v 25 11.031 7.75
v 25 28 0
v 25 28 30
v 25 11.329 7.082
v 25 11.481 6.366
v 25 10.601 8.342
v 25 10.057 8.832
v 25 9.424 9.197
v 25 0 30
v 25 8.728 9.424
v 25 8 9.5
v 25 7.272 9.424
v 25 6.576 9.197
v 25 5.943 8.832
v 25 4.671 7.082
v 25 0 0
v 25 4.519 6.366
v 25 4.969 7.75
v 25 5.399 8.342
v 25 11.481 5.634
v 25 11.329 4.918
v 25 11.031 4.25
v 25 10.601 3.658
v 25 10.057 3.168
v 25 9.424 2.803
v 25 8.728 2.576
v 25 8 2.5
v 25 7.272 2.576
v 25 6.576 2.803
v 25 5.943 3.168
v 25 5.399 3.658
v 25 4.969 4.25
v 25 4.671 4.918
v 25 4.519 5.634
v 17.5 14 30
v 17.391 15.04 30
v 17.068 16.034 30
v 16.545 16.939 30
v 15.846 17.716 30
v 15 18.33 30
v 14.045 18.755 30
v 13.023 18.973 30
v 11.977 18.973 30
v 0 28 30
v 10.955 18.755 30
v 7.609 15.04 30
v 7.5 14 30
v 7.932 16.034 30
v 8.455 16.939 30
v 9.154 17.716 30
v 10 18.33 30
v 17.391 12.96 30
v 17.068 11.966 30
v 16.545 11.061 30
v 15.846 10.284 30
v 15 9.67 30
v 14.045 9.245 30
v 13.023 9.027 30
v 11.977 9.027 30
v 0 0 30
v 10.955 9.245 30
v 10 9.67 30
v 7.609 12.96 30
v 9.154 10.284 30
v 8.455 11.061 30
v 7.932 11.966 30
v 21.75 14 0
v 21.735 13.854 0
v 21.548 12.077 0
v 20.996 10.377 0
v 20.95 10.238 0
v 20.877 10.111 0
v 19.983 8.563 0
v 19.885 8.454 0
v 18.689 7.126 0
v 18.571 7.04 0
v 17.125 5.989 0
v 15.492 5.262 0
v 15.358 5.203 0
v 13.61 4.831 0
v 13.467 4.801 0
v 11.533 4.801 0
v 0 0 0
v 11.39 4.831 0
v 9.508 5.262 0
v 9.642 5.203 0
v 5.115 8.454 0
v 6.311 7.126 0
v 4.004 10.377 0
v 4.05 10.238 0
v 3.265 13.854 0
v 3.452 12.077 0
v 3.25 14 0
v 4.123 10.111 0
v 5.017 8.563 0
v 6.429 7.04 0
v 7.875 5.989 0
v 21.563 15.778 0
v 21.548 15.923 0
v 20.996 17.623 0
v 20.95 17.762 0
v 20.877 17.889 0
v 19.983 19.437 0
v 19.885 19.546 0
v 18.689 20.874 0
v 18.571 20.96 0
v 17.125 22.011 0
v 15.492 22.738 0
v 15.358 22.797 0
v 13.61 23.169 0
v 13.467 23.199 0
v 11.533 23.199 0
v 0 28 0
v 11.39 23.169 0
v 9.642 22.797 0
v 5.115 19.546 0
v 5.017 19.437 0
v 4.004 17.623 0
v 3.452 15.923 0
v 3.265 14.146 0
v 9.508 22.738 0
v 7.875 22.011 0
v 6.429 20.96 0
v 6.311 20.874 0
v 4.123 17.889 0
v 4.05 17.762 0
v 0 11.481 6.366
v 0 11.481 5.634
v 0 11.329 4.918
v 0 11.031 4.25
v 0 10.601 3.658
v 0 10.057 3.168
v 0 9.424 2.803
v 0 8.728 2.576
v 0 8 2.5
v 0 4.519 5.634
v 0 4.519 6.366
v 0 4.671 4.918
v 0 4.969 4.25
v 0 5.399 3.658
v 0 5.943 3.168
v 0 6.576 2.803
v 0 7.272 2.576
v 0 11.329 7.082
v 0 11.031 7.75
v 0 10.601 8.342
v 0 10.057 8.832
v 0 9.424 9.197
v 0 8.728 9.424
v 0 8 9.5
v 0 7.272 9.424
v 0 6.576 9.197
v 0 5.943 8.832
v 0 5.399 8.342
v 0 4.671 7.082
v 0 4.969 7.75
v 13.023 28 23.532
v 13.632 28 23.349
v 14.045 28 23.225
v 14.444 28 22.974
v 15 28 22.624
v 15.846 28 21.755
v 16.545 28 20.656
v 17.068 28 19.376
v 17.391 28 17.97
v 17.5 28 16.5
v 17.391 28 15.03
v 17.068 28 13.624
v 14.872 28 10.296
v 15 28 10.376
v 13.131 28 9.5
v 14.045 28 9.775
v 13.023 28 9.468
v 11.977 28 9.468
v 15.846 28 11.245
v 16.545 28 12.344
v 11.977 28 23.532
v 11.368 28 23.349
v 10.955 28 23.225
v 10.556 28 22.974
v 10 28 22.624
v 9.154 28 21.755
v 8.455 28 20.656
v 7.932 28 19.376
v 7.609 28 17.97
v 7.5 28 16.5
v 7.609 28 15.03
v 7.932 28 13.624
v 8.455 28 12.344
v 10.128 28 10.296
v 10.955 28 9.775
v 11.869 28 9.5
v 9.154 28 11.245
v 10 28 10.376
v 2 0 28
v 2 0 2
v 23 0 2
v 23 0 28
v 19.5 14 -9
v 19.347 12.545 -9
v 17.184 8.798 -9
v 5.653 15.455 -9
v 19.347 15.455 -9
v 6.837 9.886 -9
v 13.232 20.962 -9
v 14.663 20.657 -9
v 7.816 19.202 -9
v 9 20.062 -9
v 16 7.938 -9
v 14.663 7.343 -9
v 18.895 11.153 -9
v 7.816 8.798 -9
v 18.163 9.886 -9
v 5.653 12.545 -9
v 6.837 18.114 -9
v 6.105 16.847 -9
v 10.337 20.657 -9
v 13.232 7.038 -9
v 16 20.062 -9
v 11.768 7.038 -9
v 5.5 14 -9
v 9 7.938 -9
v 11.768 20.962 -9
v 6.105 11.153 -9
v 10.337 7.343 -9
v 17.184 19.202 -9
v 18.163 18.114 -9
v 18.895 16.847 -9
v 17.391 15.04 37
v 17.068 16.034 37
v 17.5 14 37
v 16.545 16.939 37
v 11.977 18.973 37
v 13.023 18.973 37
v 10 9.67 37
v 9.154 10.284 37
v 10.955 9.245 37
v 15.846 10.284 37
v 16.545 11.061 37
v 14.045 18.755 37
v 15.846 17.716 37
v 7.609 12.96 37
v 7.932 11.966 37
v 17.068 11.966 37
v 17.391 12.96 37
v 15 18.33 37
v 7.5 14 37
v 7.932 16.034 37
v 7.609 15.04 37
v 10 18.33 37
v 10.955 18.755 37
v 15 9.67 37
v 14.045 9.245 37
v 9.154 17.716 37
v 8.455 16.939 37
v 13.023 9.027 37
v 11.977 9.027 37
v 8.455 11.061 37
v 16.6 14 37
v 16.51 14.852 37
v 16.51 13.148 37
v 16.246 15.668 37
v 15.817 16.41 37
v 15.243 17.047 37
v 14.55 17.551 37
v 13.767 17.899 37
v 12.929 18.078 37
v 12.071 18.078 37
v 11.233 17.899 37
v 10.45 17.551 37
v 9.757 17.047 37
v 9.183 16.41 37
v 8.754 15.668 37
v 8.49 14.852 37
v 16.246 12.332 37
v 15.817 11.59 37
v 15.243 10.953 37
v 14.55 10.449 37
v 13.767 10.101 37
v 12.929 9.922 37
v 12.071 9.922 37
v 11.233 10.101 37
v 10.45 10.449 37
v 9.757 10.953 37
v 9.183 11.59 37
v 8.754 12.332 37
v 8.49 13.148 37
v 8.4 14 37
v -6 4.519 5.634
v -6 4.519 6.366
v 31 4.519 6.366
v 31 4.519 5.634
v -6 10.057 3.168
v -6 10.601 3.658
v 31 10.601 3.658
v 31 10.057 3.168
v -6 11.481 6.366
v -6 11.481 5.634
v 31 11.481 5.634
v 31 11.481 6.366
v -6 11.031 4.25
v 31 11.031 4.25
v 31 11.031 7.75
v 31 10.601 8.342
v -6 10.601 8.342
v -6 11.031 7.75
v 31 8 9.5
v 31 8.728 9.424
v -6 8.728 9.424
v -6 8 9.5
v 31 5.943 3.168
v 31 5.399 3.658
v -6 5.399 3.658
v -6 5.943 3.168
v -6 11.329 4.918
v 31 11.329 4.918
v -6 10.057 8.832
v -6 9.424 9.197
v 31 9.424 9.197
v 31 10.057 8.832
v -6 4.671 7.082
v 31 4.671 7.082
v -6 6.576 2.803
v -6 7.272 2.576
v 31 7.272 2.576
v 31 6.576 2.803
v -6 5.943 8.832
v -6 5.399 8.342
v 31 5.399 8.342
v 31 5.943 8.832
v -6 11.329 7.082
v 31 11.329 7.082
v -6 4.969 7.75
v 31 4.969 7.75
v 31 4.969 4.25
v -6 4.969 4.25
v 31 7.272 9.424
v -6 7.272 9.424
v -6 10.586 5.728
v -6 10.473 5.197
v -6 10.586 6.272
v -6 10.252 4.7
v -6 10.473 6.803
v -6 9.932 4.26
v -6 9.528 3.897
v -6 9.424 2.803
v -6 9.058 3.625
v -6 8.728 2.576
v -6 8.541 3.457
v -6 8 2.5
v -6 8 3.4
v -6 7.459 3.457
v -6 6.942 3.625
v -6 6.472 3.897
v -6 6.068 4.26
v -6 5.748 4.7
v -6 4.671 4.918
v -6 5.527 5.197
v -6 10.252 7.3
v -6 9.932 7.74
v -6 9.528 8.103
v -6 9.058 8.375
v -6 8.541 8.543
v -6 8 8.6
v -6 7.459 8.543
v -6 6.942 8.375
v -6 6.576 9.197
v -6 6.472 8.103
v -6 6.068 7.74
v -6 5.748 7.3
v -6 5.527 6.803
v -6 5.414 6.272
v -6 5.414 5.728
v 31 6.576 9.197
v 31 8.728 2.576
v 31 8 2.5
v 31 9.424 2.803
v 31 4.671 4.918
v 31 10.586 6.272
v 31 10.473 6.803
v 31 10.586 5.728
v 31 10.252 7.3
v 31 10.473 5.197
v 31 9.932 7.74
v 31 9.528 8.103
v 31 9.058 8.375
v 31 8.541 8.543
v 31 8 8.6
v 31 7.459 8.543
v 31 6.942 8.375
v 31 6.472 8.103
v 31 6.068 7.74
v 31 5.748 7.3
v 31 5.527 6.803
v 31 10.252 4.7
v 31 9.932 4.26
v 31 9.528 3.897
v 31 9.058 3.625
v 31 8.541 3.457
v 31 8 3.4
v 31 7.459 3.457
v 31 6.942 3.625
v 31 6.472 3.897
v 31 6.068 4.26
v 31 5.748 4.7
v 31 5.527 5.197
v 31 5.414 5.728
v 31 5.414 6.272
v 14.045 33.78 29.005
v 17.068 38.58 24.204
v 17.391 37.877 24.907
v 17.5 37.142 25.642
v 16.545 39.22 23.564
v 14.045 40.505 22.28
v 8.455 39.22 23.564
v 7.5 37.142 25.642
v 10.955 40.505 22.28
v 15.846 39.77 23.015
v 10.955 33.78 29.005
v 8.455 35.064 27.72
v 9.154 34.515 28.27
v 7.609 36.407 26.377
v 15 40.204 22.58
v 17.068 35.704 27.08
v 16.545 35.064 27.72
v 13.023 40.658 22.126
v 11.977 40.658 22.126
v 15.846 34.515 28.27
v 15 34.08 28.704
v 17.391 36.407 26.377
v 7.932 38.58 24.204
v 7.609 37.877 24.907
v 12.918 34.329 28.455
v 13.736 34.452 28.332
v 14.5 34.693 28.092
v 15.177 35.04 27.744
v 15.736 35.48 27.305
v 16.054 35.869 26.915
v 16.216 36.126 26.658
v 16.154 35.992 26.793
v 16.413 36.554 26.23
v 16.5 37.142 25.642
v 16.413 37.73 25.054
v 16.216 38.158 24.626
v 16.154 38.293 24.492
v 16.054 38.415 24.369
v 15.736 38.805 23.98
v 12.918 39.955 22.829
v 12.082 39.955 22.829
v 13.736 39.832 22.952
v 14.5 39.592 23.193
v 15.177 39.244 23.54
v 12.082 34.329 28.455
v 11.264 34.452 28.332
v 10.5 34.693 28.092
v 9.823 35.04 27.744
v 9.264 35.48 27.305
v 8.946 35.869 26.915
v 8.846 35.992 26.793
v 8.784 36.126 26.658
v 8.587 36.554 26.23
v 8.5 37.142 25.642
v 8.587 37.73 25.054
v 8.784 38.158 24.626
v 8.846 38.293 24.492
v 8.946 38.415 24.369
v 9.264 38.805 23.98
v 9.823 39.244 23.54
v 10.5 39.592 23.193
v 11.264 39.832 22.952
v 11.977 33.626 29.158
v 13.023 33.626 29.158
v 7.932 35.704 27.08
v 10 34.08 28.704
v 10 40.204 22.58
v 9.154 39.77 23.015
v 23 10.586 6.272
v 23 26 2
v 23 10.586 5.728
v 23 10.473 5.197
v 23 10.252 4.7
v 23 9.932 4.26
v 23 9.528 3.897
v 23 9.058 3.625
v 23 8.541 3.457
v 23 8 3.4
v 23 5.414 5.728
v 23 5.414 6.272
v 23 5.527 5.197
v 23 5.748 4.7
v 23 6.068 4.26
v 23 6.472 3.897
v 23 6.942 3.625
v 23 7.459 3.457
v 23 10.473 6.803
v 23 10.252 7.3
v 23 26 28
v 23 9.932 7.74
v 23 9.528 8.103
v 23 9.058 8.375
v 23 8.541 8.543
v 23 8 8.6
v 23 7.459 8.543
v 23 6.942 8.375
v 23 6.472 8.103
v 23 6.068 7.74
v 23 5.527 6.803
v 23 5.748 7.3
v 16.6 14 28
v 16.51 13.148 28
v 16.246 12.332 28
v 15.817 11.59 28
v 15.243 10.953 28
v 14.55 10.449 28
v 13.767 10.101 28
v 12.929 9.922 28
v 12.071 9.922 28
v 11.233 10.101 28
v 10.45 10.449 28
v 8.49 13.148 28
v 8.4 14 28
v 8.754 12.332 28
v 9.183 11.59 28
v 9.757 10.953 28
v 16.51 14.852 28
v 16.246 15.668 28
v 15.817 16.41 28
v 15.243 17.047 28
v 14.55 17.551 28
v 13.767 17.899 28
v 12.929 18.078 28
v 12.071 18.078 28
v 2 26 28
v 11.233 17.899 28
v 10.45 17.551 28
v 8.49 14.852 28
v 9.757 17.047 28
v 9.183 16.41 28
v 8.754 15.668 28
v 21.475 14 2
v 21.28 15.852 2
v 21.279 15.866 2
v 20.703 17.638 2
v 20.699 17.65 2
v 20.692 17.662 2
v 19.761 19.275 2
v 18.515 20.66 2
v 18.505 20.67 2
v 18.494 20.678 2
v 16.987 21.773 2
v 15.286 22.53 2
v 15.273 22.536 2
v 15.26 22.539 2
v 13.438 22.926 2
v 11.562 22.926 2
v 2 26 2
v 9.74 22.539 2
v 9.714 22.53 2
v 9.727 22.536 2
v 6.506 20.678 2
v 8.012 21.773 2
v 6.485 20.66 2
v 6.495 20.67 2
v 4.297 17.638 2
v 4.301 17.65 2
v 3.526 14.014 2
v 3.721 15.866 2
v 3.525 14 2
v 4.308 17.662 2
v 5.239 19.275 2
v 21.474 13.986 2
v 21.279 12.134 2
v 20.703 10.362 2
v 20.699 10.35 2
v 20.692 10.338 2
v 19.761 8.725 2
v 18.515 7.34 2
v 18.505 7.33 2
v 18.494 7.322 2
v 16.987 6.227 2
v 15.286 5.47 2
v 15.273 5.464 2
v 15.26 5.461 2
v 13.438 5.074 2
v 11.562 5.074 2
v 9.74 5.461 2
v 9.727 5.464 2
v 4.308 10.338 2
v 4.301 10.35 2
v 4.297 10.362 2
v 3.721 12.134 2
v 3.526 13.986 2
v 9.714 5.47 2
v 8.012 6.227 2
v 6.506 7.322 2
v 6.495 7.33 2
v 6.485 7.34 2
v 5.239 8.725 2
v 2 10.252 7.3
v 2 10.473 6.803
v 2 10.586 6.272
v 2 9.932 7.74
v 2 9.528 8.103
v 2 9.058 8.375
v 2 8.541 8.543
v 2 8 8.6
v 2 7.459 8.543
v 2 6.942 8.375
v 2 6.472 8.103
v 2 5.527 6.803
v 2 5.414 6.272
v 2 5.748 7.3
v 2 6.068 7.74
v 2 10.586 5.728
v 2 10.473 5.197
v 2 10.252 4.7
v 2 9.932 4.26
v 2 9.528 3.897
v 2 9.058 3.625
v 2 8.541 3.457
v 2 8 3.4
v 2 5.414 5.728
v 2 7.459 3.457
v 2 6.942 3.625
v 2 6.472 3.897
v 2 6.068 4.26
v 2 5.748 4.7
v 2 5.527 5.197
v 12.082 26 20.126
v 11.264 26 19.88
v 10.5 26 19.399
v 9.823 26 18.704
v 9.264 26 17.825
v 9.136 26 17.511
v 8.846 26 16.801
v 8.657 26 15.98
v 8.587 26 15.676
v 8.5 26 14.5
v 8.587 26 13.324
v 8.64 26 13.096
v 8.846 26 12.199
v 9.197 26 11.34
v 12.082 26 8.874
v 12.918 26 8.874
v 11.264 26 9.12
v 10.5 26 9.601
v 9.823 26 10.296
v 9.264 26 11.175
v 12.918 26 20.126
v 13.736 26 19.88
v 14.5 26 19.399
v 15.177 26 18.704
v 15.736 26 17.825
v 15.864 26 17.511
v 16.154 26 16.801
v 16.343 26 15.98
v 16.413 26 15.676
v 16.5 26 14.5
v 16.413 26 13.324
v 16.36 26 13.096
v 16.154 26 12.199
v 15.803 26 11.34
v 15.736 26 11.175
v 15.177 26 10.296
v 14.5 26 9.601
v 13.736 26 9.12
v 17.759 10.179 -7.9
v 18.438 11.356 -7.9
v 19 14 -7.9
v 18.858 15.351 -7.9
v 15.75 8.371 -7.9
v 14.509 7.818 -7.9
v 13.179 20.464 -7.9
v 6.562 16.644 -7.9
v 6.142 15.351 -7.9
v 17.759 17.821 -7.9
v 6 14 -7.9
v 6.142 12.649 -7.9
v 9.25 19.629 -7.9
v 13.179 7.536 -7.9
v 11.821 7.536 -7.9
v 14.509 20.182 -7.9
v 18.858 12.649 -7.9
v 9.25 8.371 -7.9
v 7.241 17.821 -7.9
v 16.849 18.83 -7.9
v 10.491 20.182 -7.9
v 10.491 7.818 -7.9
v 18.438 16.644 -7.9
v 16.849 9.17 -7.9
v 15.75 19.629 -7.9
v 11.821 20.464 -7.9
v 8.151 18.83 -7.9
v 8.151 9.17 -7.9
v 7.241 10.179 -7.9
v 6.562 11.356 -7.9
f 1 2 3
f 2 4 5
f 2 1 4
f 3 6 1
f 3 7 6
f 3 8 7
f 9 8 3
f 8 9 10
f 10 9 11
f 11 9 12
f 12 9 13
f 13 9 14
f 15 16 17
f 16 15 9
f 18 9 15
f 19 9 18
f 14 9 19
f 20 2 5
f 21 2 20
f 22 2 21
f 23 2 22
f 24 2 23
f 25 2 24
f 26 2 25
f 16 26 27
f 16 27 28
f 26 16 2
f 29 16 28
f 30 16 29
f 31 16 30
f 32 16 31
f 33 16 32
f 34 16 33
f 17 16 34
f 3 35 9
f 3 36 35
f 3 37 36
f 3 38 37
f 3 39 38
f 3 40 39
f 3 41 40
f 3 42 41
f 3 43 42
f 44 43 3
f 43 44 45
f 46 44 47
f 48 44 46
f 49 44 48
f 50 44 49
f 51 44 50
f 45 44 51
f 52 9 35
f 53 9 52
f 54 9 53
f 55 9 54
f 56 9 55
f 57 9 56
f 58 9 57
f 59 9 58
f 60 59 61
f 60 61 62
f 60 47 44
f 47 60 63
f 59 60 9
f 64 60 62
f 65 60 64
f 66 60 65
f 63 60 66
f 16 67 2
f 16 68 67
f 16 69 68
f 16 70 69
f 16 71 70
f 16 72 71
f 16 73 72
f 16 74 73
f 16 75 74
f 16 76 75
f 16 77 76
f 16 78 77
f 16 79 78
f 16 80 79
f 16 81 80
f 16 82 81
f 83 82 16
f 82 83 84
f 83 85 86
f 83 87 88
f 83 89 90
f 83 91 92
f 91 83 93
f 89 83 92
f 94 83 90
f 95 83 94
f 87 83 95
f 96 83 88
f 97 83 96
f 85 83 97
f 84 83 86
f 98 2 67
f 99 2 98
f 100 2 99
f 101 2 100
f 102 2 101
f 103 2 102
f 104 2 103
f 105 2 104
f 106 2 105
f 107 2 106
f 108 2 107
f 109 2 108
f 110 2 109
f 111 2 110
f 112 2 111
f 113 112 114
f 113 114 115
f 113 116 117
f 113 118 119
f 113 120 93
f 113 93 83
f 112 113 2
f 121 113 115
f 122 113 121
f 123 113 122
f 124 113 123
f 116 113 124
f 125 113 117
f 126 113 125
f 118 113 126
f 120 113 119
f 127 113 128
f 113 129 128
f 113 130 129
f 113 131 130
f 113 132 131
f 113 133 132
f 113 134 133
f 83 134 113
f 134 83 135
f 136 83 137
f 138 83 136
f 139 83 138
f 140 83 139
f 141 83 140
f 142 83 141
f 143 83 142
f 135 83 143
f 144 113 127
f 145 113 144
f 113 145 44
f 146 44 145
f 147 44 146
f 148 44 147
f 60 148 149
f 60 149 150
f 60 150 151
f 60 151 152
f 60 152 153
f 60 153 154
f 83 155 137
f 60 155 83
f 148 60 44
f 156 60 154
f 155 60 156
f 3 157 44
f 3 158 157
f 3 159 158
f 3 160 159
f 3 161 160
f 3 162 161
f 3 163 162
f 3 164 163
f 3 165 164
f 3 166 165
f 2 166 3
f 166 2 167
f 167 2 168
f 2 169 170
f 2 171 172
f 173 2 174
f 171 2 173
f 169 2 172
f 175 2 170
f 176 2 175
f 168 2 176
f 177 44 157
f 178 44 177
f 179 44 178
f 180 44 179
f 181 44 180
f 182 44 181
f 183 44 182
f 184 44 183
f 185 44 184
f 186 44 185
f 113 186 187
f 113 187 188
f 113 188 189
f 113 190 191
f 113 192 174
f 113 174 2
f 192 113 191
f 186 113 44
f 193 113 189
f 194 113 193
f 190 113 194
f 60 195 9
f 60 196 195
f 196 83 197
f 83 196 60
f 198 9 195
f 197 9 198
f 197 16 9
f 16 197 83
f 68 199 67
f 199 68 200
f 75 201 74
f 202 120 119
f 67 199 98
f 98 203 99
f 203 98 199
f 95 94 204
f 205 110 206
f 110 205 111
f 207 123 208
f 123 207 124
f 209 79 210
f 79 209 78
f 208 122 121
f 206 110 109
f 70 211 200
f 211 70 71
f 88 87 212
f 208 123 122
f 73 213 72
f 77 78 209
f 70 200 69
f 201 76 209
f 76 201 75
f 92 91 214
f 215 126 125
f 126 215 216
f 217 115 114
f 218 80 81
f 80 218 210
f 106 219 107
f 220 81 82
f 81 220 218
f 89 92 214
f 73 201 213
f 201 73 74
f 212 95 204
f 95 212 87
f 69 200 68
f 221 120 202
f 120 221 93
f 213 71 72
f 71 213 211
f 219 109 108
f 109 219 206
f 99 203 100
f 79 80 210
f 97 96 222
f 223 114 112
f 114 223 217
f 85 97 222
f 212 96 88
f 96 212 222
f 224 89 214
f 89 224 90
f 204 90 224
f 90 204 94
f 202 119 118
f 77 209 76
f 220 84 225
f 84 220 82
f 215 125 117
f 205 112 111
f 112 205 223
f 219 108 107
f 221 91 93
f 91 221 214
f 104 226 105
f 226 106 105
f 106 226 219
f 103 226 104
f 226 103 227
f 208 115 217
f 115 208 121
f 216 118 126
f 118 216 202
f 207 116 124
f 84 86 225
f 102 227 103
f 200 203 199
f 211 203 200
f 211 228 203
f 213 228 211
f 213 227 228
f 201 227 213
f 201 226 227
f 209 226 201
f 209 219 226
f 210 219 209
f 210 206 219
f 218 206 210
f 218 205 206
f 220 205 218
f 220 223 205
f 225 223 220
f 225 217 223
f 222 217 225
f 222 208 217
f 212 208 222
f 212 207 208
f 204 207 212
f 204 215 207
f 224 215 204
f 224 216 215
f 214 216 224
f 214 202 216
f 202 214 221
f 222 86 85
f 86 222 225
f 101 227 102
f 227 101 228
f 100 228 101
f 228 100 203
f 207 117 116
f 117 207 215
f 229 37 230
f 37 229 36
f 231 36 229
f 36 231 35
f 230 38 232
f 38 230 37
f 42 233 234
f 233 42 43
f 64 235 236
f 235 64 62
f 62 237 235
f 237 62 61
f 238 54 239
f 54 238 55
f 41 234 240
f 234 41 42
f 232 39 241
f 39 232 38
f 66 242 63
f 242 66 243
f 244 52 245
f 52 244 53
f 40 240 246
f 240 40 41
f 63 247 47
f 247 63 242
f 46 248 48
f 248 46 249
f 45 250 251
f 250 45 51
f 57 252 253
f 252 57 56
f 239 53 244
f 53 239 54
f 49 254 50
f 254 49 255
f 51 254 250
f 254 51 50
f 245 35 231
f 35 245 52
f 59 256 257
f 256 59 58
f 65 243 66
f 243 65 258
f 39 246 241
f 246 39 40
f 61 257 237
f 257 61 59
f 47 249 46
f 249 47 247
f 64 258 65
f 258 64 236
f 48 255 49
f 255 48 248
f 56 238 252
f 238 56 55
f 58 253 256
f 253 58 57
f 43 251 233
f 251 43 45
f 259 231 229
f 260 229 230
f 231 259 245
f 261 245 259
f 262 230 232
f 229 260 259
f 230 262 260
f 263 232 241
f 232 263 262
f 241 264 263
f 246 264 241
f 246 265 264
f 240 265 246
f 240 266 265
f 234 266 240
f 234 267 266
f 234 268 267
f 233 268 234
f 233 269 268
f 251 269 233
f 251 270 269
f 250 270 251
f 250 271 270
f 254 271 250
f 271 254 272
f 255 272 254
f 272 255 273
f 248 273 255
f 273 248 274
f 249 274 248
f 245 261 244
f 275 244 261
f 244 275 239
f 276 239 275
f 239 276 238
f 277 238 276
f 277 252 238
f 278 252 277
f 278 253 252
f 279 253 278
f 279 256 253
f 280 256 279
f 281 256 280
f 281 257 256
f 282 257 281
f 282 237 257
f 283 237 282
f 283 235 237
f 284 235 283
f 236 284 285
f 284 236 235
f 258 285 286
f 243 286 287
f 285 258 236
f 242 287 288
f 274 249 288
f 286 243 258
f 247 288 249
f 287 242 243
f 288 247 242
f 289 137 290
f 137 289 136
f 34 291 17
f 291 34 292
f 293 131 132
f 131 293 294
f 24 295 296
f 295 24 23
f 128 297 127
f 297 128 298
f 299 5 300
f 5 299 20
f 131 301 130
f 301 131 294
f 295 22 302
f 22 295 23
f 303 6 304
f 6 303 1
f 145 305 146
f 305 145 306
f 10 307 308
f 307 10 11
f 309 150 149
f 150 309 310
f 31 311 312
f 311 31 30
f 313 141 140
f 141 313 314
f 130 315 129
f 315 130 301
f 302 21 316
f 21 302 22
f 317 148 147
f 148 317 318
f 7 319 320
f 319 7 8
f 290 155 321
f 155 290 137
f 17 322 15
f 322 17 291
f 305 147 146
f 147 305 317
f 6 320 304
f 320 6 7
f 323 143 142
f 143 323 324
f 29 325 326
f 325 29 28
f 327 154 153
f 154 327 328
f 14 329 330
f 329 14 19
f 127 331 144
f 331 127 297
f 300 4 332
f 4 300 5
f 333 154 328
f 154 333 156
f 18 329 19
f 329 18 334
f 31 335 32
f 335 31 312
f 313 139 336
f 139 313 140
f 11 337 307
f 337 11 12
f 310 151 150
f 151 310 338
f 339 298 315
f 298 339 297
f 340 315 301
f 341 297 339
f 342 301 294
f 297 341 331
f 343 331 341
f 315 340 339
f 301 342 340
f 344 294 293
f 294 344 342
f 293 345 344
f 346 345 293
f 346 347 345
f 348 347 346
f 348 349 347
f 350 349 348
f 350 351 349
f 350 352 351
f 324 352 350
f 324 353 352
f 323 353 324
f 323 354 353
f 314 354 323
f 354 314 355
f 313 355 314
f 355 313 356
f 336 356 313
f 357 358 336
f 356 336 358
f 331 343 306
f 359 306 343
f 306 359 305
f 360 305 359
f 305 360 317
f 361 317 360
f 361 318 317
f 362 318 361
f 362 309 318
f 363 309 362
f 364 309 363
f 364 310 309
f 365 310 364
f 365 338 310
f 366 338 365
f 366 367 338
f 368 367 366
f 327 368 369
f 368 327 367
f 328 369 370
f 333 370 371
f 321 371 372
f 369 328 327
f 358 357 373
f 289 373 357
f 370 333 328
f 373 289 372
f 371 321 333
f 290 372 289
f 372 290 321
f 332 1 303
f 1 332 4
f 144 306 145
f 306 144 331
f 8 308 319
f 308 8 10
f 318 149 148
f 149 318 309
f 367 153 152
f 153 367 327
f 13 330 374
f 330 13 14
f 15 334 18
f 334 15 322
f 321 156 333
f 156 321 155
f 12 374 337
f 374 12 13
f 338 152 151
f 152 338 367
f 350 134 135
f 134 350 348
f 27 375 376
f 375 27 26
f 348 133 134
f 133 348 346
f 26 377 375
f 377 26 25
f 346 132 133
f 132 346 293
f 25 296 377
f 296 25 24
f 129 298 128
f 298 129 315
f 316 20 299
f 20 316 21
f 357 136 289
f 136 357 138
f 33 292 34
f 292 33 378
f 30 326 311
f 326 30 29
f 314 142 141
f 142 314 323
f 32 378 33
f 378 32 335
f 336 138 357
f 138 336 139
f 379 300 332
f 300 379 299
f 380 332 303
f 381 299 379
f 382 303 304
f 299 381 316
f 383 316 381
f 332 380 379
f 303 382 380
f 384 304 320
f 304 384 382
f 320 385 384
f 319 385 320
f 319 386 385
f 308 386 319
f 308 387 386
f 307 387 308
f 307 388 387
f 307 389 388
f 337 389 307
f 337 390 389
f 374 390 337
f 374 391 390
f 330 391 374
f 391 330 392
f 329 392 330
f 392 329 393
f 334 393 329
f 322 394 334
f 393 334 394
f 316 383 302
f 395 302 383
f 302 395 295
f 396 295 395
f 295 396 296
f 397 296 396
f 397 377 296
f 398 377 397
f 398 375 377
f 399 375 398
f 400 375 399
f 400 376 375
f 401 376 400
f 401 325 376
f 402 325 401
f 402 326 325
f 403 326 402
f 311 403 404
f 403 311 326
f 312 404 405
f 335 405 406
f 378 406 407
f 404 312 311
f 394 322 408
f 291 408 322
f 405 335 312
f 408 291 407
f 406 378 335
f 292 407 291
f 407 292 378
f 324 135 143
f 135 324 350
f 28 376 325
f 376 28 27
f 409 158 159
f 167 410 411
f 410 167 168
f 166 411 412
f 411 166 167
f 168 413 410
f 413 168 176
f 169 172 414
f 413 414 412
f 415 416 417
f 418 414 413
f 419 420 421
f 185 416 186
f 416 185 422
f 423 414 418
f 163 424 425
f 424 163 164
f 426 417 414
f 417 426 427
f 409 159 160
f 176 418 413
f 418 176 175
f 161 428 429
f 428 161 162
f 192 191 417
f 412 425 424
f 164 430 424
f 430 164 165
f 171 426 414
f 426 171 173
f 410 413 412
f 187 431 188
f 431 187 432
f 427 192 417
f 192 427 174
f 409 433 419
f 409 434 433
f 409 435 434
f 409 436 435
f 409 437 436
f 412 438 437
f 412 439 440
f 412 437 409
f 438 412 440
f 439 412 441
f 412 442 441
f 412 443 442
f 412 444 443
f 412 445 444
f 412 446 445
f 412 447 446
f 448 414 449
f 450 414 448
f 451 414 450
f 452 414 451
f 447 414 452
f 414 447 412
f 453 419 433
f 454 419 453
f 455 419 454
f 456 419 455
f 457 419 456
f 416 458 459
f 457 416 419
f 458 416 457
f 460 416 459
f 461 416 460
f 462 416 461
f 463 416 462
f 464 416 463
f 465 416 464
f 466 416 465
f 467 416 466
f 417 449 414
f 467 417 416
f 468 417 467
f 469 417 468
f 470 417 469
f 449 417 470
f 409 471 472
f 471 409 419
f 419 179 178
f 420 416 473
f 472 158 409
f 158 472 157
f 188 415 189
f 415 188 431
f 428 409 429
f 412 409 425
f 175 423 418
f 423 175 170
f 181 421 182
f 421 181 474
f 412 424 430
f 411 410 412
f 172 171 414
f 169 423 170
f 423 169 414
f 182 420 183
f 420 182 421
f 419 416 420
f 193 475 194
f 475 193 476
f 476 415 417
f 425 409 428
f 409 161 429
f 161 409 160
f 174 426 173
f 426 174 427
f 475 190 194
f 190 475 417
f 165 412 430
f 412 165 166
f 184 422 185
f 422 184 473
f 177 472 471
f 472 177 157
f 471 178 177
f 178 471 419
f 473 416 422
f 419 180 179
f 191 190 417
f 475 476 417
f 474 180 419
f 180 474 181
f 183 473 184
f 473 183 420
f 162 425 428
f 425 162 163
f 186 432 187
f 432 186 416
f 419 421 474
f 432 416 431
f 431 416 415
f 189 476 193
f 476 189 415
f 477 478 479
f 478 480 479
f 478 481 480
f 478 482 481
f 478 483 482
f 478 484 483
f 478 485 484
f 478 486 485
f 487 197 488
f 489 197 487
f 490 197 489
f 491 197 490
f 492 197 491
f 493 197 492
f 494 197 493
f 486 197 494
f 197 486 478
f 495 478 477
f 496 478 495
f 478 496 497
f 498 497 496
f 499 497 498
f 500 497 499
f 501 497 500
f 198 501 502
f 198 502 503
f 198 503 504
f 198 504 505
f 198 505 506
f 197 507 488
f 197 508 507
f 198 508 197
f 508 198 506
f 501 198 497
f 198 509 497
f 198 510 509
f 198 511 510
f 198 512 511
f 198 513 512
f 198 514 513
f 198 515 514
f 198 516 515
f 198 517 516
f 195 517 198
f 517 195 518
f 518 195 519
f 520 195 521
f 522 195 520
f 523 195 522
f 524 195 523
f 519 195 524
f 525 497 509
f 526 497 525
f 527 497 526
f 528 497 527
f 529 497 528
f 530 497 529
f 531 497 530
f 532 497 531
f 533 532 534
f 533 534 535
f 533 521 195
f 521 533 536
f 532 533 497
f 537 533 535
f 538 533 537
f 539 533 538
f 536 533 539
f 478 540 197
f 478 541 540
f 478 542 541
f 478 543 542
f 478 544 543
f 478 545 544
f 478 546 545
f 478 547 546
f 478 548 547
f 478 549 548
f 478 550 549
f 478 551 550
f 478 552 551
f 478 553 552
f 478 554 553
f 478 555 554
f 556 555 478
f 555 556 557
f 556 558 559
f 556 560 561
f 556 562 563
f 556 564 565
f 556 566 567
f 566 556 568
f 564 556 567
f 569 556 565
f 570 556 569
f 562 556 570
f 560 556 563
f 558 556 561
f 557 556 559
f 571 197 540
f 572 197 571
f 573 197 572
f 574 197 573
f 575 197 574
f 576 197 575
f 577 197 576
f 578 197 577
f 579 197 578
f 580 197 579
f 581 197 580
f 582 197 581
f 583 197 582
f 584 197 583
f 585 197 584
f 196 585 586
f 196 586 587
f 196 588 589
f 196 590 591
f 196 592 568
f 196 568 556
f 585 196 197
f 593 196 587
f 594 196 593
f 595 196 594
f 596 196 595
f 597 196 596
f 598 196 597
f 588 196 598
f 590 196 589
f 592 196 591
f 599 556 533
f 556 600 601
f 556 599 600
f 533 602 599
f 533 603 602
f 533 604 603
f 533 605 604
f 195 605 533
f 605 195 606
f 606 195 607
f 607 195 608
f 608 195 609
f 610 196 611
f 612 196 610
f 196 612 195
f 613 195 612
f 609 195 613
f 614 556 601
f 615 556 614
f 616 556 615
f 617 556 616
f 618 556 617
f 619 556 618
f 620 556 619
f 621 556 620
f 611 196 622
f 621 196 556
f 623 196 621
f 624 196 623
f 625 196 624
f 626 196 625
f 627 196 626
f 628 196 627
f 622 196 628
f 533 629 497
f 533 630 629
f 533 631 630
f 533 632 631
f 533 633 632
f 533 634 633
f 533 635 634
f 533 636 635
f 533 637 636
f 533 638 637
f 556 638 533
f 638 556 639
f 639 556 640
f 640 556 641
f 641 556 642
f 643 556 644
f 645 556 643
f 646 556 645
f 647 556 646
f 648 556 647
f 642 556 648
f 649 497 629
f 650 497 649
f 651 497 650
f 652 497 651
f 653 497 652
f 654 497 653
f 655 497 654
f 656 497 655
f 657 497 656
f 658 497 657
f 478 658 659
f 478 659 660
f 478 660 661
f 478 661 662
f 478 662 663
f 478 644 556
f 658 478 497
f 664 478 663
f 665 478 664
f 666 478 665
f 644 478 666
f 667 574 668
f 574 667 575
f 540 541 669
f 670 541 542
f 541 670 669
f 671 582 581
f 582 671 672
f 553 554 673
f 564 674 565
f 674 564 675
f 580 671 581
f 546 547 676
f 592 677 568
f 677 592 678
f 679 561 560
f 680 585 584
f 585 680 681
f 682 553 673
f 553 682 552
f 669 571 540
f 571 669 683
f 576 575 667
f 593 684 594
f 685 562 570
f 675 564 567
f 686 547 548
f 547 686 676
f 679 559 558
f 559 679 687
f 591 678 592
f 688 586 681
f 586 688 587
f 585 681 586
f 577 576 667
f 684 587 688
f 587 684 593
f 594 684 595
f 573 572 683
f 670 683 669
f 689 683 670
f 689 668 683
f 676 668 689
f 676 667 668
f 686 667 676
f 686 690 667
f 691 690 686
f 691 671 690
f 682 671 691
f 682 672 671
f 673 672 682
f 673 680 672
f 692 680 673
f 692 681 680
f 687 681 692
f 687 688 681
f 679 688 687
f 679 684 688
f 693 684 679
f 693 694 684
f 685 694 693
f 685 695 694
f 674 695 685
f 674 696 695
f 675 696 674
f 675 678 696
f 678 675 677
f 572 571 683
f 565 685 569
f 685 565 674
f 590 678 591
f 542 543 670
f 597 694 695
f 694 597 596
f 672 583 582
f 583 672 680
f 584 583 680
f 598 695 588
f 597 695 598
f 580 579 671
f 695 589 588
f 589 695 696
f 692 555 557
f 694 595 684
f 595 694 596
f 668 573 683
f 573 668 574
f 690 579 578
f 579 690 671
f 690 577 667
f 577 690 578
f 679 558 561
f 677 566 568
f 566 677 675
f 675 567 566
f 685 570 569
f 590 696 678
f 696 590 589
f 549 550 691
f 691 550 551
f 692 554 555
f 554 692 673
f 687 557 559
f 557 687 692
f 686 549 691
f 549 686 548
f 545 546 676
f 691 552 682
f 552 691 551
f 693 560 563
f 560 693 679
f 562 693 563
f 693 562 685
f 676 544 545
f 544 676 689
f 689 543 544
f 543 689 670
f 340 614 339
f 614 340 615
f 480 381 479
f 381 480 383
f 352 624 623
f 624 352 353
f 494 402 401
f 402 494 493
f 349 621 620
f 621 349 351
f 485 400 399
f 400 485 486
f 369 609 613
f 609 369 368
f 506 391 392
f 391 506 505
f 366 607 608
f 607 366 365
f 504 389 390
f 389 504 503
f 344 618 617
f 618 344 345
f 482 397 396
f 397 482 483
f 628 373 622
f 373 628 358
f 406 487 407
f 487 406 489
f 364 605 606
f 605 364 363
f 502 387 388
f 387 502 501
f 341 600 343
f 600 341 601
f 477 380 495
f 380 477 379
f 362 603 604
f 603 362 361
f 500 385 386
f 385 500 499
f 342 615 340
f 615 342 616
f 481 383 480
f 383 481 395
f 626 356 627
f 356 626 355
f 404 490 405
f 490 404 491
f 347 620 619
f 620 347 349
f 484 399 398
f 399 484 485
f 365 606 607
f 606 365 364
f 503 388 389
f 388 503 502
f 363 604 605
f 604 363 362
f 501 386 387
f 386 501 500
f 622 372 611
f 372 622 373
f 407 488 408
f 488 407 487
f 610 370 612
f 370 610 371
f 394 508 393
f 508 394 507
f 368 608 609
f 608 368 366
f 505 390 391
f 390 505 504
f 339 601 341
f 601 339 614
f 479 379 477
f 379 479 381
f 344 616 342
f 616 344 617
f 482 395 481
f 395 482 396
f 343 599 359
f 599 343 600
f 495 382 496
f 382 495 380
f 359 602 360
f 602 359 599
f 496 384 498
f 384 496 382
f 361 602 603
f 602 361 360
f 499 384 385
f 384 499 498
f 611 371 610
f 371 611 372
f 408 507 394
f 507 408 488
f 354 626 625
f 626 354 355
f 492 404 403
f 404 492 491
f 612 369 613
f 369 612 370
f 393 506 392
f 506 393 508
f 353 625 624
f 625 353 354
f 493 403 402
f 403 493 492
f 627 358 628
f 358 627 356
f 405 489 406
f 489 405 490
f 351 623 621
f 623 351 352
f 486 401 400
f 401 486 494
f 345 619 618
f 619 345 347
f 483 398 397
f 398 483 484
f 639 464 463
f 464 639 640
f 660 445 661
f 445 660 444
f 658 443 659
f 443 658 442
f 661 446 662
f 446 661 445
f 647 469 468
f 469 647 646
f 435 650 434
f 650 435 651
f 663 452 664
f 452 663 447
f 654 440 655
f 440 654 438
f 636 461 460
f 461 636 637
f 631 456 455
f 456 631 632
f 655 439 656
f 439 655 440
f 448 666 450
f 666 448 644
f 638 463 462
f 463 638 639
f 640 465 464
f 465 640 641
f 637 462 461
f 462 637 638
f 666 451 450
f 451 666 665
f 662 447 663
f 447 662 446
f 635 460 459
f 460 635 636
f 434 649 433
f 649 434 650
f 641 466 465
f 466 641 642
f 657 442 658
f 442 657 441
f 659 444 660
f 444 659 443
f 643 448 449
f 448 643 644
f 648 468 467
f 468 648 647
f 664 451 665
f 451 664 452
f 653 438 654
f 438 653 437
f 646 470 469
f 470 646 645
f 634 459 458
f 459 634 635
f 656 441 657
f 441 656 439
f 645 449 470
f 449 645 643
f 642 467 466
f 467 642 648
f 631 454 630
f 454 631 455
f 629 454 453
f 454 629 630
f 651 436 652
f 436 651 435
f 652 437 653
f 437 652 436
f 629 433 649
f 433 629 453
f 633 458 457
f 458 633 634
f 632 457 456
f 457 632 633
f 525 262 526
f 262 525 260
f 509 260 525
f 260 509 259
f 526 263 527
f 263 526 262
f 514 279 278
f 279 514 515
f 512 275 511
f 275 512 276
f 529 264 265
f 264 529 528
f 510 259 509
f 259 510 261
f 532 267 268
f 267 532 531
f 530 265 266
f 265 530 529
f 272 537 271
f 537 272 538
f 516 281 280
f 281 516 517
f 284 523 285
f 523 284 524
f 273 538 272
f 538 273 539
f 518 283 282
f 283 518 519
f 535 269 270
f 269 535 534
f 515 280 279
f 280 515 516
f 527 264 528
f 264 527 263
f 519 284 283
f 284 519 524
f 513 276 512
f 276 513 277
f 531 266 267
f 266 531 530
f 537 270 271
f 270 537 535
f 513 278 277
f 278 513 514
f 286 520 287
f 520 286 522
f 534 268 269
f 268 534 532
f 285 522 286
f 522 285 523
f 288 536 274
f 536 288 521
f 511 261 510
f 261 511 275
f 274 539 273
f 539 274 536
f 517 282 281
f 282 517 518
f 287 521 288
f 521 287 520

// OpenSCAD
// file: ring.scad
///////////////////////////////////////
// Module to make rings              //
// aka cylinders with holes in them  //
// ring (hole diameter,              //
//       ring thickness,             //
//       ring height)                //
// developed by AM Chagas 09-2019    //
//      CC-BY-SA 4.0                 //
///////////////////////////////////////

module ring(ringd=10,ringb=5,ringh=2){
    difference(){
        cylinder(d=ringd+ringb,h=ringh);
        translate([0,0,-1]){
            cylinder(d=ringd,h=ringh+2);
        }//endtranslate
    }//end difference
}//end module

//ring(10,10,50);
// main file
///////////////////////////////////////////
// Design for a magazine entry to be used//
// in the behaviour box                  //
// Andre Maia Chagas - Cansu Demirbatir  //
// 16082021                              //
///////////////////////////////////////////

// all dimensions in mm.

//needs the ring.scad file (saved on the same folder)
use <ring.scad>

//// variables /////////////

//magazine LED
magledD = 8; // magazine LED diameter

//back plate dimensions 
//(the plate that slides on the metal railings)
backpanelx = 52.5*2;
backpanely = 60;
backpanelz = 2.8;

supportw=5;

//dimensions for the headport 

headportx = 25;
headporty = 28;
headportz = 30;

//wall thickness
headportwall = 2;

//infrared led dimensions
irledd = 5;
irledh = 6;

//pellet dispenser tube
pelletD = 8;

/* change this depending on the printer and printer settings
   it is a "tolerance" variable, so holes and fittings can be 
   adjusted.
*/
tol = 0.1;

$fn=30;

module magazine(panel=1){
//backpanel
difference(){



union(){
if (panel==1){    
    translate([-(backpanely-headporty)/2,-0.1,(-backpanelx+headportx)/2]){
cube([backpanely,backpanelz,backpanelx]);
}
}
cube([headportx,headporty,headportz]);


//well
translate([headportx/2,headporty/2,-(headporty-10)/2]){
cylinder(d1=headporty/2,d2=headporty/2+5,h=10);
}//end translate

//magazine led
translate([headportx/2,headporty/2,headportz]){
cylinder(d=magledD+headportwall,h=7);
}//end translate



//IR detector holes
translate([headportx+irledh,8,6]){
rotate([0,-90,0]){
cylinder(d=irledd+headportwall,h=headportx+irledh*2);
}//end rotate
}//end translate

//pellet shute
translate([headportx/2,headporty-2.5*headportwall,headportz/4+4]){
rotate([-45,0,0]){
cylinder(d=pelletD+headportwall,h=20);
}//end rotate
}//end translate


}//end union



//negative
union(){
//central hole
translate([headportwall,headportwall-5,headportwall]){
cube([headportx-headportwall*2,headporty-headportwall*2+5,headportz-headportwall*2]);
}//end translate
//well
translate([headportx/2,headporty/2,-(headporty-10)/2+1.1]){
cylinder(d1=headporty/2-1,d2=headporty/2+5-1,h=10);
}
//ir led holes
translate([headportx+irledh+1,8,6]){
rotate([0,-90,0]){
cylinder(d=irledd+2*tol,h=headportx+irledh*2+2);
}//end rotate
}//end translate

//pellet shute
translate([headportx/2,headporty-2.5*headportwall-2,headportz/4+2]){
rotate([-45,0,0]){
cylinder(d=pelletD,h=30);
}//end rotate
}//end translate


//magazine led
translate([headportx/2,headporty/2,headportz-headportwall-2]){
cylinder(d=magledD+2*tol,h=20);
}//end translate
}//end union
}//end differnece
//headentry

}//end module
magazine(panel=0);
